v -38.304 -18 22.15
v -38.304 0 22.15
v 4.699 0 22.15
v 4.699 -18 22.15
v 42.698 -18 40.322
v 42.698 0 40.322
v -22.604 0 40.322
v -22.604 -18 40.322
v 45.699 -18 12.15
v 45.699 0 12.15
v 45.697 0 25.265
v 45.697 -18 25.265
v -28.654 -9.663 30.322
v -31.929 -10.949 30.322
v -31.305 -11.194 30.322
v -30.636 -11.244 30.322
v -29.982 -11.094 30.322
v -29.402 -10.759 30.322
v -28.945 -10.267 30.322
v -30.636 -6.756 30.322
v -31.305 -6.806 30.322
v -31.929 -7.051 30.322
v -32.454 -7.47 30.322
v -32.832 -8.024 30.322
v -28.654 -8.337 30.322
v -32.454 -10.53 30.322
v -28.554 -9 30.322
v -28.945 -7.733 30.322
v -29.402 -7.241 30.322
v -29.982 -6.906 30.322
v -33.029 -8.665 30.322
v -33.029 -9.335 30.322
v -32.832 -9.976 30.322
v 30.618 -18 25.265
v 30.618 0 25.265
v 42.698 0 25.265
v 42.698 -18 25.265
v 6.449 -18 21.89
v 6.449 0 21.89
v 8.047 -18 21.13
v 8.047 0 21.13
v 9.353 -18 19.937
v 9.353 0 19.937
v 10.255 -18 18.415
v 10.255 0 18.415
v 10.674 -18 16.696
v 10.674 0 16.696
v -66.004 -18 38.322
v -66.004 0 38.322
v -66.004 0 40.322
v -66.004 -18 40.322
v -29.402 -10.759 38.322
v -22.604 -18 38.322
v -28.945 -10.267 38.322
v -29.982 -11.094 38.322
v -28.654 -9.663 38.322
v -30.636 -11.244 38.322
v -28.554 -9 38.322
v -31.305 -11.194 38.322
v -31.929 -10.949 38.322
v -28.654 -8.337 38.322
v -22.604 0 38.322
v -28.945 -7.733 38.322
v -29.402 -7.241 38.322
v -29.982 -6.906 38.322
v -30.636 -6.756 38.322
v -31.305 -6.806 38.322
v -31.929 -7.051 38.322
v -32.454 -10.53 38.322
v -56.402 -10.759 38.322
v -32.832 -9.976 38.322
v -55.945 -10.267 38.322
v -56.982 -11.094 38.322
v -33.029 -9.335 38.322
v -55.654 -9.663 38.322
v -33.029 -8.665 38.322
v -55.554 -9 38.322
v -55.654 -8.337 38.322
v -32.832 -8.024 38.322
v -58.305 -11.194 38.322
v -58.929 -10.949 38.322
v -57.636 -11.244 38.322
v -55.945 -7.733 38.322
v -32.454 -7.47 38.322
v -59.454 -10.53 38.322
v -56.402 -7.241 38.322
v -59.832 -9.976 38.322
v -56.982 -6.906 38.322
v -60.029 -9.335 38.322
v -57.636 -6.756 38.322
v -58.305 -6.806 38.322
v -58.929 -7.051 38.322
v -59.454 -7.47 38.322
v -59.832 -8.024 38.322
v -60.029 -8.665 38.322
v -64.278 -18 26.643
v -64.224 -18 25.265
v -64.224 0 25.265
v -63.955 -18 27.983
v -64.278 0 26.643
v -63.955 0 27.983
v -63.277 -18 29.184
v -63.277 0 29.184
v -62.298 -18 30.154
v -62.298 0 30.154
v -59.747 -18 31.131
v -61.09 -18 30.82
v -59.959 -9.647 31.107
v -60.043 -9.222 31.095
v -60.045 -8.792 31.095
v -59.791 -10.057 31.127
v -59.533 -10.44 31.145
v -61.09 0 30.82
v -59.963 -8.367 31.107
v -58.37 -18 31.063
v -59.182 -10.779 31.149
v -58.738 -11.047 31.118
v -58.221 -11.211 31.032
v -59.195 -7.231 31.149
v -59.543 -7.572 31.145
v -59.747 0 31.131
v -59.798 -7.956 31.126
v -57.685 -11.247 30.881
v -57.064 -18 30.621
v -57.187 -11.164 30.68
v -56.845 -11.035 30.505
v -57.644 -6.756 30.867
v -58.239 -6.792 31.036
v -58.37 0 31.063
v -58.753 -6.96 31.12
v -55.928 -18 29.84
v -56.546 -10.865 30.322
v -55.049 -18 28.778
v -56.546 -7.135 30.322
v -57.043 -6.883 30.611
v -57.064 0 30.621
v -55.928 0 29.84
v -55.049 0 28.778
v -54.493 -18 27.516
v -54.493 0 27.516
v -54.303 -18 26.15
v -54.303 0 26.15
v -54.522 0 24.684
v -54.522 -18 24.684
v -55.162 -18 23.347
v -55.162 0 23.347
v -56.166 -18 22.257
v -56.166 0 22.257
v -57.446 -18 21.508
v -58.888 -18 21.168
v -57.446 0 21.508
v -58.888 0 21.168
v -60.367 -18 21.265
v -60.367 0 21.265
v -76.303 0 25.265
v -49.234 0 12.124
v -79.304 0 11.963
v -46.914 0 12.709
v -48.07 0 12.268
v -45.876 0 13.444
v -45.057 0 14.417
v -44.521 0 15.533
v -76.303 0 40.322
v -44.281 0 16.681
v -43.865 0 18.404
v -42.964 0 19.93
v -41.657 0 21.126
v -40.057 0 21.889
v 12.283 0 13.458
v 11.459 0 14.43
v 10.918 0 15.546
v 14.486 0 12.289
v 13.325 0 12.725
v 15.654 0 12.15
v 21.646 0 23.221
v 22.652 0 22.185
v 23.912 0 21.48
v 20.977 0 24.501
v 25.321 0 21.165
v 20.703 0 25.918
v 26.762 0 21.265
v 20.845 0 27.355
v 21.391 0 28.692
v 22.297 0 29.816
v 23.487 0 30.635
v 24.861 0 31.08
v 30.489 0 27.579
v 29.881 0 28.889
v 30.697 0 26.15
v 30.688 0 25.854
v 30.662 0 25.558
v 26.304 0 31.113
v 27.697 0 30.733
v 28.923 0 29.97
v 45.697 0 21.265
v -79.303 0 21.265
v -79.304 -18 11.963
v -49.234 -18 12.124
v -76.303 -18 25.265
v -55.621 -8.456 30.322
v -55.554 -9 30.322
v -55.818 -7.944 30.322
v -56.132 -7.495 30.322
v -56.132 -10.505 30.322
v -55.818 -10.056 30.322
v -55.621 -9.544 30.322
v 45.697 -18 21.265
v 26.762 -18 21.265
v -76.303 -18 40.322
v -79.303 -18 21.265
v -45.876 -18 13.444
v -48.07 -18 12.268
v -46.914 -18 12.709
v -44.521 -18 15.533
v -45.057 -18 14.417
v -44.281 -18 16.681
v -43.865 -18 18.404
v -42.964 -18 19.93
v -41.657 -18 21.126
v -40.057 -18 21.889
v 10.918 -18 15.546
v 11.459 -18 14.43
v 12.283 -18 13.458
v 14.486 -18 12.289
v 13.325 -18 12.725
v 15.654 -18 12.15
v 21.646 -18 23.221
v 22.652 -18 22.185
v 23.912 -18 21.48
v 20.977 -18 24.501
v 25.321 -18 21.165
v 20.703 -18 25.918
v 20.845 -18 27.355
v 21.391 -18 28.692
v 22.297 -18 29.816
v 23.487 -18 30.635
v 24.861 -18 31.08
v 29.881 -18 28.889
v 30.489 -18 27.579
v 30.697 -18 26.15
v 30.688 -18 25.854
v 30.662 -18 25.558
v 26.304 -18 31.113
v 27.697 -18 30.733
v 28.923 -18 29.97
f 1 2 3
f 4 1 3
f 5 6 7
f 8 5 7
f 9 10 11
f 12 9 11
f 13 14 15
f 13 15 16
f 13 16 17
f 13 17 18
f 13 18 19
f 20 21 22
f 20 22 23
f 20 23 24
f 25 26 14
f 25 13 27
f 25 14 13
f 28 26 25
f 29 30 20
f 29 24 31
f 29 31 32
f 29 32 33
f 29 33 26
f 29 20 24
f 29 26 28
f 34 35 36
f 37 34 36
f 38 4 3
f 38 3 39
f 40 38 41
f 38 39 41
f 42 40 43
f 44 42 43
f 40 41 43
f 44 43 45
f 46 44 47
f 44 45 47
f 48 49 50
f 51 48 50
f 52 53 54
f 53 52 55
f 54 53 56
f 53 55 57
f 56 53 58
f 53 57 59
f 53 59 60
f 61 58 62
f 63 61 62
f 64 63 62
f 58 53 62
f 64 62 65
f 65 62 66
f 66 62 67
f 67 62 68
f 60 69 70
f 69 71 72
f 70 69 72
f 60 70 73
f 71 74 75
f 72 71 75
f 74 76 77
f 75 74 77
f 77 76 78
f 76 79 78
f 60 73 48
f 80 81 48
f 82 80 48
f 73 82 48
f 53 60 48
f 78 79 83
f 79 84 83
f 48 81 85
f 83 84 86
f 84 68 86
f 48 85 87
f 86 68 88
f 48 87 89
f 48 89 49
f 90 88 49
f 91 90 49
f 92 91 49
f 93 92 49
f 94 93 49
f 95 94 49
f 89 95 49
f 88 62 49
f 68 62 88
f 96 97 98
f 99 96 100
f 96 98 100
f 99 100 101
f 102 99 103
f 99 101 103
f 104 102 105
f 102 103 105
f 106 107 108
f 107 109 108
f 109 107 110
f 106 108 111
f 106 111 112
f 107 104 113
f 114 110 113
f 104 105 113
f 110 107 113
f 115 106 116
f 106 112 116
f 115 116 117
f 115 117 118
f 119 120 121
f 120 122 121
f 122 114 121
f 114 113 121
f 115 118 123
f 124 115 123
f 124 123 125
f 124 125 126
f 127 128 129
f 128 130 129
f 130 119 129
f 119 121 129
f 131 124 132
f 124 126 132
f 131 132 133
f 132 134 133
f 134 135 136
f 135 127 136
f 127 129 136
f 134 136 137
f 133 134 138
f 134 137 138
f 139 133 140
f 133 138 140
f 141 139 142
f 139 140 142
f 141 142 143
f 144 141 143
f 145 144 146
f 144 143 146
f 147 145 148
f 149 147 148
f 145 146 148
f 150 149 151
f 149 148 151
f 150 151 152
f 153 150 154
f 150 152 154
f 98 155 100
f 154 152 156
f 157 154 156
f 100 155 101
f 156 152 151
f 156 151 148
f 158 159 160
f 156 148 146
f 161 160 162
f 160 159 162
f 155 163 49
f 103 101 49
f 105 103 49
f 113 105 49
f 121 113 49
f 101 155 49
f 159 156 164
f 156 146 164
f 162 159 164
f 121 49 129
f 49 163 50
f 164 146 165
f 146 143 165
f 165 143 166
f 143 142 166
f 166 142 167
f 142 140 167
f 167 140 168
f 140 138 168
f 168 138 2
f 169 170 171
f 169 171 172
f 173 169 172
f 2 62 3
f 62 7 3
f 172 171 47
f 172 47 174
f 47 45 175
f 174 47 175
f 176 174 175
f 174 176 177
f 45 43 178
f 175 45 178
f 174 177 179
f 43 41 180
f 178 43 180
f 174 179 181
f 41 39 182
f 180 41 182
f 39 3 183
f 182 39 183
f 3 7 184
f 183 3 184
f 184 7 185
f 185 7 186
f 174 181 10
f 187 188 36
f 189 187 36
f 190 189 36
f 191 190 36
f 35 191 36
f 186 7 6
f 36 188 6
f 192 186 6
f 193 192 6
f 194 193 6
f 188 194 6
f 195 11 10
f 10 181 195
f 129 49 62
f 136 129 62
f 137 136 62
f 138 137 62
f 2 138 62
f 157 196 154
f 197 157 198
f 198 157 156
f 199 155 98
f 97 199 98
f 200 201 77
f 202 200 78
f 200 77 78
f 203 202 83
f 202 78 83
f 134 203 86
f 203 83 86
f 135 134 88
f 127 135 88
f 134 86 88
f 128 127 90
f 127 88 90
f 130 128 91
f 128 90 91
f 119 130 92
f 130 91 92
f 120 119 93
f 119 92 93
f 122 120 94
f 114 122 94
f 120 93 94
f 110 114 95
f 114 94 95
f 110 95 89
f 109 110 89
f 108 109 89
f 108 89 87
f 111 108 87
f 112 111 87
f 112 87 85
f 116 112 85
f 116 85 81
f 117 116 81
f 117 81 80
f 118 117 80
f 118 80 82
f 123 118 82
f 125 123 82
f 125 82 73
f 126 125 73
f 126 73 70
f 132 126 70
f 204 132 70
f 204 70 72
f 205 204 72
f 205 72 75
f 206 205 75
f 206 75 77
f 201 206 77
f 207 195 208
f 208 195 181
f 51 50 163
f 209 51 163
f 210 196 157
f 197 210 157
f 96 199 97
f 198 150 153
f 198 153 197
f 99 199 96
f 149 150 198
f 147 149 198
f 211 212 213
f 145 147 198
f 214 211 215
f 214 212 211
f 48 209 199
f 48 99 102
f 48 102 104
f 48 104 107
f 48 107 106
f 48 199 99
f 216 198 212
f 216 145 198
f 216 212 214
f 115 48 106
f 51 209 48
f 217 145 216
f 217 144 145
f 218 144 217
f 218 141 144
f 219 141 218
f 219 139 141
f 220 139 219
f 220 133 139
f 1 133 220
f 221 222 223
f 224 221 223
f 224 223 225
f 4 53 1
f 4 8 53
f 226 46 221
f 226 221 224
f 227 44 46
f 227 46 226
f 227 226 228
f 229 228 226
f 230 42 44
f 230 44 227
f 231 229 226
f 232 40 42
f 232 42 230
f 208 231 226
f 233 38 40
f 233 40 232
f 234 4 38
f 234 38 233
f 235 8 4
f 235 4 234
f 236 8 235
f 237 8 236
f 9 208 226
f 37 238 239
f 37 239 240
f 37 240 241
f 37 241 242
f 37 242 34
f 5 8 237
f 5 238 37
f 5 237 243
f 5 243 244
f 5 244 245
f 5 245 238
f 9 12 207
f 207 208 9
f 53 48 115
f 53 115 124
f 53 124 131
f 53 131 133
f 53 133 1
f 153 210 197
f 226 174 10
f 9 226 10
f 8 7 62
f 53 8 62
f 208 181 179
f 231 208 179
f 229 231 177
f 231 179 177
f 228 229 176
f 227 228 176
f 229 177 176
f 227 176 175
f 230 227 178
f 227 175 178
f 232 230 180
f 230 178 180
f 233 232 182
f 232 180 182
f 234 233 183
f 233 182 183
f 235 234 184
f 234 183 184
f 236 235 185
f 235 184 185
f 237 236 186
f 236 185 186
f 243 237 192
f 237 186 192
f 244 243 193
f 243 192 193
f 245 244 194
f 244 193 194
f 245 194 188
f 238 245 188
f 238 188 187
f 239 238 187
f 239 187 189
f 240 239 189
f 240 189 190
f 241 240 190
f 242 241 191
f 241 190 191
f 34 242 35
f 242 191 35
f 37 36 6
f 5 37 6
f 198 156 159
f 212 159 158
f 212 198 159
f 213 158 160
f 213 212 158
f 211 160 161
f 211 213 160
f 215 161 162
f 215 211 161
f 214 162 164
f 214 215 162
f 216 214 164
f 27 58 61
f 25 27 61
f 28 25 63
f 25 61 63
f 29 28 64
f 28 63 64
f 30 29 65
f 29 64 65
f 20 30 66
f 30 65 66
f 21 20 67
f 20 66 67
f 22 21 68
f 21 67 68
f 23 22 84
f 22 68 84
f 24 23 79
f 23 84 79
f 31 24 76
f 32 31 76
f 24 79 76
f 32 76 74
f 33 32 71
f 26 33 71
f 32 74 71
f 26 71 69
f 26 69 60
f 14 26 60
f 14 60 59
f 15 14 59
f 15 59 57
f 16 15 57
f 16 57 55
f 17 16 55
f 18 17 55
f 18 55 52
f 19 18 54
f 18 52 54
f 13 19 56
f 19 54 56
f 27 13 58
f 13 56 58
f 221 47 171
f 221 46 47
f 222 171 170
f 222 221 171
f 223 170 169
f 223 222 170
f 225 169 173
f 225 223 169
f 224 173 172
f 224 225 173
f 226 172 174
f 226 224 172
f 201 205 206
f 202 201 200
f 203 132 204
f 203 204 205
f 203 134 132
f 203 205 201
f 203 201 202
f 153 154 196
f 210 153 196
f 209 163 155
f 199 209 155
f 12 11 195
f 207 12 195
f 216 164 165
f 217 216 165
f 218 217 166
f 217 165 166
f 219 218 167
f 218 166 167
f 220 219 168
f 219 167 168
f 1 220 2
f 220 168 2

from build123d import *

# Parameters (mm, degrees)
F1_DEPTH = 18
F2_R     = 5
F3_R     = 2.25
F4_DEPTH = 8


# Not quite as in the source:
# - a feature names something its author has since deleted; it is built from what else it names


with BuildPart() as f1:
    # F0 (on Front) → F1 (new body)
    with BuildSketch(Plane.XZ):
        with BuildLine():
            ThreePointArc((-64.2237368111, 25.2650516673), (-59.7471801328, 31.1306109239), (-54.3027456241, 26.150402297))
            ThreePointArc((-54.3027456241, 26.150402297), (-56.1661028164, 22.2566288192), (-60.3673343828, 21.2650516673))
            Line((-60.3673343828, 21.2650516673), (-79.3032296173, 21.2650516673))
            Line((-79.3032296173, 21.2650516673), (-79.3043551346, 11.9631245031))
            Line((-79.3043551346, 11.9631245031), (-44.3043551346, 12.150402297))
            Line((-44.3043551346, 12.150402297), (-44.3043551346, 16.150402297))
            ThreePointArc((-44.3043551346, 16.150402297), (-42.5469958217, 20.3930429841), (-38.3043551346, 22.150402297))
            Line((-38.3043551346, 22.150402297), (4.6990865829, 22.150402297))
            ThreePointArc((4.6990865829, 22.150402297), (8.94172727, 20.3930429841), (10.6990865829, 16.150402297))
            Line((10.6990865829, 16.150402297), (10.6990865829, 12.150402297))
            Line((10.6990865829, 12.150402297), (45.6990865829, 12.150402297))
            Line((45.6990865829, 12.150402297), (45.6973702434, 25.2650516673))
            Line((45.6973702434, 25.2650516673), (45.6973702434, 21.2650516673))
            Line((45.6973702434, 21.2650516673), (42.6977375527, 21.2650516673))
            Line((42.6977375527, 21.2650516673), (26.7618431345, 21.2650516673))
            ThreePointArc((26.7618431345, 21.2650516673), (21.803480898, 29.2870451047), (30.6972543759, 26.150402297))
            ThreePointArc((30.6972543759, 26.150402297), (30.6774630028, 25.7059677883), (30.6182455629, 25.2650516673))
            Line((30.6182455629, 25.2650516673), (42.6977375527, 25.2650516673))
            Line((42.6977375527, 25.2650516673), (42.6977375527, 40.3215353384))
            Line((42.6977375527, 40.3215353384), (34.3958526514, 40.3215353384))
            Line((34.3958526514, 40.3215353384), (9.5622779218, 40.3215353384))
            Line((9.5622779218, 40.3215353384), (-22.6043551346, 40.3215353384))
            Line((-22.6043551346, 40.3215353384), (-22.6043551346, 38.3215353384))
            Line((-22.6043551346, 38.3215353384), (-44.3043551346, 38.3215353384))
            Line((-44.3043551346, 38.3215353384), (-66.0043551346, 38.3215353384))
            Line((-66.0043551346, 38.3215353384), (-66.0043551346, 40.3215353384))
            Line((-66.0043551346, 40.3215353384), (-76.3027456241, 40.3215353384))
            Line((-76.3027456241, 40.3215353384), (-76.3027456241, 25.2650516673))
            Line((-76.3027456241, 25.2650516673), (-64.2237368111, 25.2650516673))
        make_face()
    extrude(amount=F1_DEPTH)

    # F2
    f2_edges = [f1.edges().sort_by_distance(p)[0] for p in [
        (-44.304355, -9, 12.150402),
        (10.699087, -9, 12.150402),
    ]]
    fillet(f2_edges, radius=F2_R)

    # F3 (on face) → F4 (cut)
    with BuildSketch(Plane.XY.offset(38.3215353384)):
        with Locations((-30.8043551346, -9)):
            Circle(F3_R)
        with Locations((-57.8043551346, -9)):
            Circle(F3_R)
    extrude(amount=-F4_DEPTH, mode=Mode.SUBTRACT)


solid = f1.part
